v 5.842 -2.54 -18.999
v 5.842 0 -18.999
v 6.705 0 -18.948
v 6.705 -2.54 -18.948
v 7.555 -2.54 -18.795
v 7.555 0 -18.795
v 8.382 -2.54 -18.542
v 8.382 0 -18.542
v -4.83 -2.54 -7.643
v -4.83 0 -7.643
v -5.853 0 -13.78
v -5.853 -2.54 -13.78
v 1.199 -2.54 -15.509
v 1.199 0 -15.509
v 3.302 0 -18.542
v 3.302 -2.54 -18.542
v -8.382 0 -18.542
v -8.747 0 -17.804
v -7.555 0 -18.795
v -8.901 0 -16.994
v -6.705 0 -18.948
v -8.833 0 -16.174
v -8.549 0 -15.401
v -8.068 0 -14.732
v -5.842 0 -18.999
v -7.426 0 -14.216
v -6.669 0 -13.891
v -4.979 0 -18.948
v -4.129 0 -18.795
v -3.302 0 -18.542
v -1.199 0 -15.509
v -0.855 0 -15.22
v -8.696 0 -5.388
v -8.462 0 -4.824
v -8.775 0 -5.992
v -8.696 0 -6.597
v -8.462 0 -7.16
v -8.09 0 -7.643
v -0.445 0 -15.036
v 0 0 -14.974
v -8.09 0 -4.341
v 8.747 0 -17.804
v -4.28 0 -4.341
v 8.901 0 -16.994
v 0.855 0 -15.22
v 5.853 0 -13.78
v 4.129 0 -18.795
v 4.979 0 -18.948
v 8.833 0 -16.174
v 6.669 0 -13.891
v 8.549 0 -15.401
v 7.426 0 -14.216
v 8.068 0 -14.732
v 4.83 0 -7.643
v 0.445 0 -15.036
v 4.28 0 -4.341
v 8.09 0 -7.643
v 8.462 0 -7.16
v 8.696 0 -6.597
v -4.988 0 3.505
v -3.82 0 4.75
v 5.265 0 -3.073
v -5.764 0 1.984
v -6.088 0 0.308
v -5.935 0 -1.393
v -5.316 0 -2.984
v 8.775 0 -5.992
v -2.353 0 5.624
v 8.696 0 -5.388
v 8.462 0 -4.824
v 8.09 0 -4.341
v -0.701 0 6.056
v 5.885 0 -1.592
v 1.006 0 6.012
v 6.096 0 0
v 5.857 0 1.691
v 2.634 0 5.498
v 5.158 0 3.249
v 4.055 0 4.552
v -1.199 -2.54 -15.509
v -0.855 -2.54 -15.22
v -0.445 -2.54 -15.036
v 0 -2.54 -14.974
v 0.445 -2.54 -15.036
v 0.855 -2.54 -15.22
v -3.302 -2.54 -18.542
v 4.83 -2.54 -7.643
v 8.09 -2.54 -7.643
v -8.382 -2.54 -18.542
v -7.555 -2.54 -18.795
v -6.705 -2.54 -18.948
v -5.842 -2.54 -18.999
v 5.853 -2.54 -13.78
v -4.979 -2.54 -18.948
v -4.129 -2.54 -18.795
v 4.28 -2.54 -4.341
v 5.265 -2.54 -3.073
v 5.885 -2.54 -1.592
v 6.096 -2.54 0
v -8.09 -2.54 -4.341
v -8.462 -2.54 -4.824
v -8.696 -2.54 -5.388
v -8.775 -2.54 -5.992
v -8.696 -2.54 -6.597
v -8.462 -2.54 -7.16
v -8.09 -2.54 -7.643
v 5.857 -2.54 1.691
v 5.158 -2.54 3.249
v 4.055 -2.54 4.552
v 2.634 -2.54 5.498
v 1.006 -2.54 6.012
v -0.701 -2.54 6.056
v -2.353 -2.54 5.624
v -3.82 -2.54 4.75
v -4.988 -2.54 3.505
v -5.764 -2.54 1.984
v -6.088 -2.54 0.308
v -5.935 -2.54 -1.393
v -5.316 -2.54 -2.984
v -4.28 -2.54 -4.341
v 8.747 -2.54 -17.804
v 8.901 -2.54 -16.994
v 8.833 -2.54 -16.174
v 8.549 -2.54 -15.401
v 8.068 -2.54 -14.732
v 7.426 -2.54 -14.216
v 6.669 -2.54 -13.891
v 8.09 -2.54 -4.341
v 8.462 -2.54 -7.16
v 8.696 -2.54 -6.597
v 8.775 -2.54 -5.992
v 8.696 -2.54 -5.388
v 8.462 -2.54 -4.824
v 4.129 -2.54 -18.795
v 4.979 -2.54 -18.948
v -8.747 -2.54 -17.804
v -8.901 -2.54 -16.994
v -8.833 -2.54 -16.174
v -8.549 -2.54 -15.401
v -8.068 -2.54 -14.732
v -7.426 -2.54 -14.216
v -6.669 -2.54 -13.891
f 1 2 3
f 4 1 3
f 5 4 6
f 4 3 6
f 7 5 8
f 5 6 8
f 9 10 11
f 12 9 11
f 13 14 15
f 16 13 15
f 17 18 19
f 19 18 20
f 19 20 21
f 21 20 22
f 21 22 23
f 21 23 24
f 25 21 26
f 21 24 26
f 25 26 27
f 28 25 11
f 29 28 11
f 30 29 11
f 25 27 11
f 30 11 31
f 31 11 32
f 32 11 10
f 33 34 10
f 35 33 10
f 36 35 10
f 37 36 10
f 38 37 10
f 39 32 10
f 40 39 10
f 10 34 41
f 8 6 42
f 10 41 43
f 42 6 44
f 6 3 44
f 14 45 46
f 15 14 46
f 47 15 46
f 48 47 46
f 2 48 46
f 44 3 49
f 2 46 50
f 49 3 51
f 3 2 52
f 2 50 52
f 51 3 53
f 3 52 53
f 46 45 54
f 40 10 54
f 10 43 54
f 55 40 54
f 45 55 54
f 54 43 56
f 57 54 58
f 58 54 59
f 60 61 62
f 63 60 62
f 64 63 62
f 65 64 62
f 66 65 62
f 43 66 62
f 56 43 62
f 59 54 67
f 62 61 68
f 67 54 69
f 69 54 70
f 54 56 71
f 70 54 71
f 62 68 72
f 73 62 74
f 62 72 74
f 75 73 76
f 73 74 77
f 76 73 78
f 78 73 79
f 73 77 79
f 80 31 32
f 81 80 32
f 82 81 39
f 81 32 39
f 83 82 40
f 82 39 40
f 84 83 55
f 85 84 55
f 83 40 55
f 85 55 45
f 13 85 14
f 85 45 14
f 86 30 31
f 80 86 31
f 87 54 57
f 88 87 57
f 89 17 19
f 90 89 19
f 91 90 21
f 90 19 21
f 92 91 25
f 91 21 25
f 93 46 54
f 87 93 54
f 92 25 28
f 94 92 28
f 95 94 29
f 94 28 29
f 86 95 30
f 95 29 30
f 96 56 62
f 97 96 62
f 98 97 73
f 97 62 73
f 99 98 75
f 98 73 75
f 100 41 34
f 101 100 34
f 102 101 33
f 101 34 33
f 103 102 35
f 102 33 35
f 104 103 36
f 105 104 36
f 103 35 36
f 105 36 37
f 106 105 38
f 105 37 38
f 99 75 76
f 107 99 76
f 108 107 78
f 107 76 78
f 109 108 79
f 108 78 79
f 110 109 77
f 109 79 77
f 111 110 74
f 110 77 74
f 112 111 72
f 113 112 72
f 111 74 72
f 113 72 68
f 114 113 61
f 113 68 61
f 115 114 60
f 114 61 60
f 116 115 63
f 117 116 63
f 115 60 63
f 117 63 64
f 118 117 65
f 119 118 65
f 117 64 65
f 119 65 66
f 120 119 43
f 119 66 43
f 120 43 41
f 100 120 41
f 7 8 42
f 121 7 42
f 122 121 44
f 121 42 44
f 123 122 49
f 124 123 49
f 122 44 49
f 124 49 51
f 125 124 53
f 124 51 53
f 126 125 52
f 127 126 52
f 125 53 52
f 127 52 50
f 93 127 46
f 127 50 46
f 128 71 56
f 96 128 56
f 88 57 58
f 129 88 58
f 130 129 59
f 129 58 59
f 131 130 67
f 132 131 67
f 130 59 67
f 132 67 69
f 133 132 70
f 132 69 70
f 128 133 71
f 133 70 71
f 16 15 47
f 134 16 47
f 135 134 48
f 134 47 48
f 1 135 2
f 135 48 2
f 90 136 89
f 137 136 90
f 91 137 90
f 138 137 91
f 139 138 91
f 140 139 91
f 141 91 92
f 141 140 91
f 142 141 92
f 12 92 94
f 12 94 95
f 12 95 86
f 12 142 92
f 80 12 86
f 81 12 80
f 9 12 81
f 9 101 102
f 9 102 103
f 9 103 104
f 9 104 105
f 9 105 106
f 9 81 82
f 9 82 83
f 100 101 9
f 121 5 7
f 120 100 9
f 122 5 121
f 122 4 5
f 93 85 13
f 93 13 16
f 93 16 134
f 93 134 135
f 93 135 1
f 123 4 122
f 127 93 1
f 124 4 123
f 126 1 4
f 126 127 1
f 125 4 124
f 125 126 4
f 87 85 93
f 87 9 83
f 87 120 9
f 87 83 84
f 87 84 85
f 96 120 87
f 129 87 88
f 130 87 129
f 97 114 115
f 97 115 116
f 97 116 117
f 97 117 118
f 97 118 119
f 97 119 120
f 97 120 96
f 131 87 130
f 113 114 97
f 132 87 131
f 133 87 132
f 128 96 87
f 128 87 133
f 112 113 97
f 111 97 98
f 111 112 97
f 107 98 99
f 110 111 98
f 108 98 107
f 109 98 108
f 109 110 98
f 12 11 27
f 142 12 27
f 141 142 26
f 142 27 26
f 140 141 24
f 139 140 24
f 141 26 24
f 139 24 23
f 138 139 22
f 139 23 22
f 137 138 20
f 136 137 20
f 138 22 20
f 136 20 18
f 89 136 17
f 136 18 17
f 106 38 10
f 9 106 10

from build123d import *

# Parameters (mm, degrees)
F1_DEPTH = 2.54


with BuildPart() as f1:
    # F0 (on Front) → F1 (new body)
    with BuildSketch(Plane.XZ):
        with BuildLine():
            ThreePointArc((4.2795464076, -4.3412784459), (5.6235811944, -2.3529875795), (6.096, 0))
            ThreePointArc((6.096, 0), (-2.3529875795, 5.6235811944), (-4.2795464076, -4.3412784459))
            Line((-4.2795464076, -4.3412784459), (-3.556, 0))
            Line((-3.556, 0), (0, 0))
            Line((0, 0), (3.556, 0))
            Line((3.556, 0), (4.2795464076, -4.3412784459))
        make_face()
        with BuildLine():
            Line((-3.556, 0), (-4.2795464076, -4.3412784459))
            ThreePointArc((-4.2795464076, -4.3412784459), (0, -6.096), (4.2795464076, -4.3412784459))
            Line((4.2795464076, -4.3412784459), (3.556, 0))
            Line((3.556, 0), (0, 0))
            Line((0, 0), (-3.556, 0))
        make_face()
        with BuildLine():
            ThreePointArc((4.2795464076, -4.3412784459), (0, -6.096), (-4.2795464076, -4.3412784459))
            Line((-4.2795464076, -4.3412784459), (-4.572, -6.096))
            Line((-4.572, -6.096), (-4.829879741, -7.6432784459))
            Line((-4.829879741, -7.6432784459), (-5.8526538527, -13.7799231159))
            Line((-5.8526538527, -13.7799231159), (0, -13.7799231159))
            Line((0, -13.7799231159), (5.8526538527, -13.7799231159))
            Line((5.8526538527, -13.7799231159), (4.829879741, -7.6432784459))
            Line((4.829879741, -7.6432784459), (4.572, -6.096))
            Line((4.572, -6.096), (4.2795464076, -4.3412784459))
        make_face()
        with BuildLine():
            Line((-4.572, -6.096), (-4.2795464076, -4.3412784459))
            Line((-4.2795464076, -4.3412784459), (-8.0895464076, -4.3412784459))
            ThreePointArc((-8.0895464076, -4.3412784459), (-8.7753464076, -5.9922784459), (-8.0895464076, -7.6432784459))
            Line((-8.0895464076, -7.6432784459), (-4.829879741, -7.6432784459))
            Line((-4.829879741, -7.6432784459), (-4.572, -6.096))
        make_face()
        with BuildLine():
            Line((8.0895464076, -4.3412784459), (4.2795464076, -4.3412784459))
            Line((4.2795464076, -4.3412784459), (4.572, -6.096))
            Line((4.572, -6.096), (4.829879741, -7.6432784459))
            Line((4.829879741, -7.6432784459), (8.0895464076, -7.6432784459))
            ThreePointArc((8.0895464076, -7.6432784459), (8.7753464076, -5.9922784459), (8.0895464076, -4.3412784459))
        make_face()
        with BuildLine():
            Line((0, -13.7799231159), (-5.8526538527, -13.7799231159))
            ThreePointArc((-5.8526538527, -13.7799231159), (-8.5487143204, -15.4006894585), (-8.382, -18.542))
            Line((-8.382, -18.542), (-5.842, -18.542))
            Line((-5.842, -18.542), (-3.302, -18.542))
            Line((-3.302, -18.542), (-1.1988751223, -15.5089163039))
            Line((-1.1988751223, -15.5089163039), (0, -13.7799231159))
        make_face()
        with BuildLine():
            ThreePointArc((8.382, -18.542), (8.5487143204, -15.4006894585), (5.8526538527, -13.7799231159))
            Line((5.8526538527, -13.7799231159), (0, -13.7799231159))
            Line((0, -13.7799231159), (1.1988751223, -15.5089163039))
            Line((1.1988751223, -15.5089163039), (3.302, -18.542))
            Line((3.302, -18.542), (5.842, -18.542))
            Line((5.842, -18.542), (8.382, -18.542))
        make_face()
        with BuildLine():
            Line((1.1988751223, -15.5089163039), (0, -13.7799231159))
            Line((0, -13.7799231159), (-1.1988751223, -15.5089163039))
            ThreePointArc((-1.1988751223, -15.5089163039), (0, -14.9736905706), (1.1988751223, -15.5089163039))
        make_face()
        with BuildLine():
            Line((-5.842, -18.542), (-8.382, -18.542))
            ThreePointArc((-8.382, -18.542), (-7.1324099969, -18.8839888715), (-5.842, -18.9992))
            Line((-5.842, -18.9992), (-5.842, -18.542))
        make_face()
        with BuildLine():
            ThreePointArc((5.842, -18.9992), (7.1324099969, -18.8839888715), (8.382, -18.542))
            Line((8.382, -18.542), (5.842, -18.542))
            Line((5.842, -18.542), (5.842, -18.9992))
        make_face()
        with BuildLine():
            Line((-3.302, -18.542), (-5.842, -18.542))
            Line((-5.842, -18.542), (-5.842, -18.9992))
            ThreePointArc((-5.842, -18.9992), (-4.5515900031, -18.8839888715), (-3.302, -18.542))
        make_face()
        with BuildLine():
            Line((5.842, -18.9992), (5.842, -18.542))
            Line((5.842, -18.542), (3.302, -18.542))
            ThreePointArc((3.302, -18.542), (4.5515900031, -18.8839888715), (5.842, -18.9992))
        make_face()
    extrude(amount=F1_DEPTH)


solid = f1.part
